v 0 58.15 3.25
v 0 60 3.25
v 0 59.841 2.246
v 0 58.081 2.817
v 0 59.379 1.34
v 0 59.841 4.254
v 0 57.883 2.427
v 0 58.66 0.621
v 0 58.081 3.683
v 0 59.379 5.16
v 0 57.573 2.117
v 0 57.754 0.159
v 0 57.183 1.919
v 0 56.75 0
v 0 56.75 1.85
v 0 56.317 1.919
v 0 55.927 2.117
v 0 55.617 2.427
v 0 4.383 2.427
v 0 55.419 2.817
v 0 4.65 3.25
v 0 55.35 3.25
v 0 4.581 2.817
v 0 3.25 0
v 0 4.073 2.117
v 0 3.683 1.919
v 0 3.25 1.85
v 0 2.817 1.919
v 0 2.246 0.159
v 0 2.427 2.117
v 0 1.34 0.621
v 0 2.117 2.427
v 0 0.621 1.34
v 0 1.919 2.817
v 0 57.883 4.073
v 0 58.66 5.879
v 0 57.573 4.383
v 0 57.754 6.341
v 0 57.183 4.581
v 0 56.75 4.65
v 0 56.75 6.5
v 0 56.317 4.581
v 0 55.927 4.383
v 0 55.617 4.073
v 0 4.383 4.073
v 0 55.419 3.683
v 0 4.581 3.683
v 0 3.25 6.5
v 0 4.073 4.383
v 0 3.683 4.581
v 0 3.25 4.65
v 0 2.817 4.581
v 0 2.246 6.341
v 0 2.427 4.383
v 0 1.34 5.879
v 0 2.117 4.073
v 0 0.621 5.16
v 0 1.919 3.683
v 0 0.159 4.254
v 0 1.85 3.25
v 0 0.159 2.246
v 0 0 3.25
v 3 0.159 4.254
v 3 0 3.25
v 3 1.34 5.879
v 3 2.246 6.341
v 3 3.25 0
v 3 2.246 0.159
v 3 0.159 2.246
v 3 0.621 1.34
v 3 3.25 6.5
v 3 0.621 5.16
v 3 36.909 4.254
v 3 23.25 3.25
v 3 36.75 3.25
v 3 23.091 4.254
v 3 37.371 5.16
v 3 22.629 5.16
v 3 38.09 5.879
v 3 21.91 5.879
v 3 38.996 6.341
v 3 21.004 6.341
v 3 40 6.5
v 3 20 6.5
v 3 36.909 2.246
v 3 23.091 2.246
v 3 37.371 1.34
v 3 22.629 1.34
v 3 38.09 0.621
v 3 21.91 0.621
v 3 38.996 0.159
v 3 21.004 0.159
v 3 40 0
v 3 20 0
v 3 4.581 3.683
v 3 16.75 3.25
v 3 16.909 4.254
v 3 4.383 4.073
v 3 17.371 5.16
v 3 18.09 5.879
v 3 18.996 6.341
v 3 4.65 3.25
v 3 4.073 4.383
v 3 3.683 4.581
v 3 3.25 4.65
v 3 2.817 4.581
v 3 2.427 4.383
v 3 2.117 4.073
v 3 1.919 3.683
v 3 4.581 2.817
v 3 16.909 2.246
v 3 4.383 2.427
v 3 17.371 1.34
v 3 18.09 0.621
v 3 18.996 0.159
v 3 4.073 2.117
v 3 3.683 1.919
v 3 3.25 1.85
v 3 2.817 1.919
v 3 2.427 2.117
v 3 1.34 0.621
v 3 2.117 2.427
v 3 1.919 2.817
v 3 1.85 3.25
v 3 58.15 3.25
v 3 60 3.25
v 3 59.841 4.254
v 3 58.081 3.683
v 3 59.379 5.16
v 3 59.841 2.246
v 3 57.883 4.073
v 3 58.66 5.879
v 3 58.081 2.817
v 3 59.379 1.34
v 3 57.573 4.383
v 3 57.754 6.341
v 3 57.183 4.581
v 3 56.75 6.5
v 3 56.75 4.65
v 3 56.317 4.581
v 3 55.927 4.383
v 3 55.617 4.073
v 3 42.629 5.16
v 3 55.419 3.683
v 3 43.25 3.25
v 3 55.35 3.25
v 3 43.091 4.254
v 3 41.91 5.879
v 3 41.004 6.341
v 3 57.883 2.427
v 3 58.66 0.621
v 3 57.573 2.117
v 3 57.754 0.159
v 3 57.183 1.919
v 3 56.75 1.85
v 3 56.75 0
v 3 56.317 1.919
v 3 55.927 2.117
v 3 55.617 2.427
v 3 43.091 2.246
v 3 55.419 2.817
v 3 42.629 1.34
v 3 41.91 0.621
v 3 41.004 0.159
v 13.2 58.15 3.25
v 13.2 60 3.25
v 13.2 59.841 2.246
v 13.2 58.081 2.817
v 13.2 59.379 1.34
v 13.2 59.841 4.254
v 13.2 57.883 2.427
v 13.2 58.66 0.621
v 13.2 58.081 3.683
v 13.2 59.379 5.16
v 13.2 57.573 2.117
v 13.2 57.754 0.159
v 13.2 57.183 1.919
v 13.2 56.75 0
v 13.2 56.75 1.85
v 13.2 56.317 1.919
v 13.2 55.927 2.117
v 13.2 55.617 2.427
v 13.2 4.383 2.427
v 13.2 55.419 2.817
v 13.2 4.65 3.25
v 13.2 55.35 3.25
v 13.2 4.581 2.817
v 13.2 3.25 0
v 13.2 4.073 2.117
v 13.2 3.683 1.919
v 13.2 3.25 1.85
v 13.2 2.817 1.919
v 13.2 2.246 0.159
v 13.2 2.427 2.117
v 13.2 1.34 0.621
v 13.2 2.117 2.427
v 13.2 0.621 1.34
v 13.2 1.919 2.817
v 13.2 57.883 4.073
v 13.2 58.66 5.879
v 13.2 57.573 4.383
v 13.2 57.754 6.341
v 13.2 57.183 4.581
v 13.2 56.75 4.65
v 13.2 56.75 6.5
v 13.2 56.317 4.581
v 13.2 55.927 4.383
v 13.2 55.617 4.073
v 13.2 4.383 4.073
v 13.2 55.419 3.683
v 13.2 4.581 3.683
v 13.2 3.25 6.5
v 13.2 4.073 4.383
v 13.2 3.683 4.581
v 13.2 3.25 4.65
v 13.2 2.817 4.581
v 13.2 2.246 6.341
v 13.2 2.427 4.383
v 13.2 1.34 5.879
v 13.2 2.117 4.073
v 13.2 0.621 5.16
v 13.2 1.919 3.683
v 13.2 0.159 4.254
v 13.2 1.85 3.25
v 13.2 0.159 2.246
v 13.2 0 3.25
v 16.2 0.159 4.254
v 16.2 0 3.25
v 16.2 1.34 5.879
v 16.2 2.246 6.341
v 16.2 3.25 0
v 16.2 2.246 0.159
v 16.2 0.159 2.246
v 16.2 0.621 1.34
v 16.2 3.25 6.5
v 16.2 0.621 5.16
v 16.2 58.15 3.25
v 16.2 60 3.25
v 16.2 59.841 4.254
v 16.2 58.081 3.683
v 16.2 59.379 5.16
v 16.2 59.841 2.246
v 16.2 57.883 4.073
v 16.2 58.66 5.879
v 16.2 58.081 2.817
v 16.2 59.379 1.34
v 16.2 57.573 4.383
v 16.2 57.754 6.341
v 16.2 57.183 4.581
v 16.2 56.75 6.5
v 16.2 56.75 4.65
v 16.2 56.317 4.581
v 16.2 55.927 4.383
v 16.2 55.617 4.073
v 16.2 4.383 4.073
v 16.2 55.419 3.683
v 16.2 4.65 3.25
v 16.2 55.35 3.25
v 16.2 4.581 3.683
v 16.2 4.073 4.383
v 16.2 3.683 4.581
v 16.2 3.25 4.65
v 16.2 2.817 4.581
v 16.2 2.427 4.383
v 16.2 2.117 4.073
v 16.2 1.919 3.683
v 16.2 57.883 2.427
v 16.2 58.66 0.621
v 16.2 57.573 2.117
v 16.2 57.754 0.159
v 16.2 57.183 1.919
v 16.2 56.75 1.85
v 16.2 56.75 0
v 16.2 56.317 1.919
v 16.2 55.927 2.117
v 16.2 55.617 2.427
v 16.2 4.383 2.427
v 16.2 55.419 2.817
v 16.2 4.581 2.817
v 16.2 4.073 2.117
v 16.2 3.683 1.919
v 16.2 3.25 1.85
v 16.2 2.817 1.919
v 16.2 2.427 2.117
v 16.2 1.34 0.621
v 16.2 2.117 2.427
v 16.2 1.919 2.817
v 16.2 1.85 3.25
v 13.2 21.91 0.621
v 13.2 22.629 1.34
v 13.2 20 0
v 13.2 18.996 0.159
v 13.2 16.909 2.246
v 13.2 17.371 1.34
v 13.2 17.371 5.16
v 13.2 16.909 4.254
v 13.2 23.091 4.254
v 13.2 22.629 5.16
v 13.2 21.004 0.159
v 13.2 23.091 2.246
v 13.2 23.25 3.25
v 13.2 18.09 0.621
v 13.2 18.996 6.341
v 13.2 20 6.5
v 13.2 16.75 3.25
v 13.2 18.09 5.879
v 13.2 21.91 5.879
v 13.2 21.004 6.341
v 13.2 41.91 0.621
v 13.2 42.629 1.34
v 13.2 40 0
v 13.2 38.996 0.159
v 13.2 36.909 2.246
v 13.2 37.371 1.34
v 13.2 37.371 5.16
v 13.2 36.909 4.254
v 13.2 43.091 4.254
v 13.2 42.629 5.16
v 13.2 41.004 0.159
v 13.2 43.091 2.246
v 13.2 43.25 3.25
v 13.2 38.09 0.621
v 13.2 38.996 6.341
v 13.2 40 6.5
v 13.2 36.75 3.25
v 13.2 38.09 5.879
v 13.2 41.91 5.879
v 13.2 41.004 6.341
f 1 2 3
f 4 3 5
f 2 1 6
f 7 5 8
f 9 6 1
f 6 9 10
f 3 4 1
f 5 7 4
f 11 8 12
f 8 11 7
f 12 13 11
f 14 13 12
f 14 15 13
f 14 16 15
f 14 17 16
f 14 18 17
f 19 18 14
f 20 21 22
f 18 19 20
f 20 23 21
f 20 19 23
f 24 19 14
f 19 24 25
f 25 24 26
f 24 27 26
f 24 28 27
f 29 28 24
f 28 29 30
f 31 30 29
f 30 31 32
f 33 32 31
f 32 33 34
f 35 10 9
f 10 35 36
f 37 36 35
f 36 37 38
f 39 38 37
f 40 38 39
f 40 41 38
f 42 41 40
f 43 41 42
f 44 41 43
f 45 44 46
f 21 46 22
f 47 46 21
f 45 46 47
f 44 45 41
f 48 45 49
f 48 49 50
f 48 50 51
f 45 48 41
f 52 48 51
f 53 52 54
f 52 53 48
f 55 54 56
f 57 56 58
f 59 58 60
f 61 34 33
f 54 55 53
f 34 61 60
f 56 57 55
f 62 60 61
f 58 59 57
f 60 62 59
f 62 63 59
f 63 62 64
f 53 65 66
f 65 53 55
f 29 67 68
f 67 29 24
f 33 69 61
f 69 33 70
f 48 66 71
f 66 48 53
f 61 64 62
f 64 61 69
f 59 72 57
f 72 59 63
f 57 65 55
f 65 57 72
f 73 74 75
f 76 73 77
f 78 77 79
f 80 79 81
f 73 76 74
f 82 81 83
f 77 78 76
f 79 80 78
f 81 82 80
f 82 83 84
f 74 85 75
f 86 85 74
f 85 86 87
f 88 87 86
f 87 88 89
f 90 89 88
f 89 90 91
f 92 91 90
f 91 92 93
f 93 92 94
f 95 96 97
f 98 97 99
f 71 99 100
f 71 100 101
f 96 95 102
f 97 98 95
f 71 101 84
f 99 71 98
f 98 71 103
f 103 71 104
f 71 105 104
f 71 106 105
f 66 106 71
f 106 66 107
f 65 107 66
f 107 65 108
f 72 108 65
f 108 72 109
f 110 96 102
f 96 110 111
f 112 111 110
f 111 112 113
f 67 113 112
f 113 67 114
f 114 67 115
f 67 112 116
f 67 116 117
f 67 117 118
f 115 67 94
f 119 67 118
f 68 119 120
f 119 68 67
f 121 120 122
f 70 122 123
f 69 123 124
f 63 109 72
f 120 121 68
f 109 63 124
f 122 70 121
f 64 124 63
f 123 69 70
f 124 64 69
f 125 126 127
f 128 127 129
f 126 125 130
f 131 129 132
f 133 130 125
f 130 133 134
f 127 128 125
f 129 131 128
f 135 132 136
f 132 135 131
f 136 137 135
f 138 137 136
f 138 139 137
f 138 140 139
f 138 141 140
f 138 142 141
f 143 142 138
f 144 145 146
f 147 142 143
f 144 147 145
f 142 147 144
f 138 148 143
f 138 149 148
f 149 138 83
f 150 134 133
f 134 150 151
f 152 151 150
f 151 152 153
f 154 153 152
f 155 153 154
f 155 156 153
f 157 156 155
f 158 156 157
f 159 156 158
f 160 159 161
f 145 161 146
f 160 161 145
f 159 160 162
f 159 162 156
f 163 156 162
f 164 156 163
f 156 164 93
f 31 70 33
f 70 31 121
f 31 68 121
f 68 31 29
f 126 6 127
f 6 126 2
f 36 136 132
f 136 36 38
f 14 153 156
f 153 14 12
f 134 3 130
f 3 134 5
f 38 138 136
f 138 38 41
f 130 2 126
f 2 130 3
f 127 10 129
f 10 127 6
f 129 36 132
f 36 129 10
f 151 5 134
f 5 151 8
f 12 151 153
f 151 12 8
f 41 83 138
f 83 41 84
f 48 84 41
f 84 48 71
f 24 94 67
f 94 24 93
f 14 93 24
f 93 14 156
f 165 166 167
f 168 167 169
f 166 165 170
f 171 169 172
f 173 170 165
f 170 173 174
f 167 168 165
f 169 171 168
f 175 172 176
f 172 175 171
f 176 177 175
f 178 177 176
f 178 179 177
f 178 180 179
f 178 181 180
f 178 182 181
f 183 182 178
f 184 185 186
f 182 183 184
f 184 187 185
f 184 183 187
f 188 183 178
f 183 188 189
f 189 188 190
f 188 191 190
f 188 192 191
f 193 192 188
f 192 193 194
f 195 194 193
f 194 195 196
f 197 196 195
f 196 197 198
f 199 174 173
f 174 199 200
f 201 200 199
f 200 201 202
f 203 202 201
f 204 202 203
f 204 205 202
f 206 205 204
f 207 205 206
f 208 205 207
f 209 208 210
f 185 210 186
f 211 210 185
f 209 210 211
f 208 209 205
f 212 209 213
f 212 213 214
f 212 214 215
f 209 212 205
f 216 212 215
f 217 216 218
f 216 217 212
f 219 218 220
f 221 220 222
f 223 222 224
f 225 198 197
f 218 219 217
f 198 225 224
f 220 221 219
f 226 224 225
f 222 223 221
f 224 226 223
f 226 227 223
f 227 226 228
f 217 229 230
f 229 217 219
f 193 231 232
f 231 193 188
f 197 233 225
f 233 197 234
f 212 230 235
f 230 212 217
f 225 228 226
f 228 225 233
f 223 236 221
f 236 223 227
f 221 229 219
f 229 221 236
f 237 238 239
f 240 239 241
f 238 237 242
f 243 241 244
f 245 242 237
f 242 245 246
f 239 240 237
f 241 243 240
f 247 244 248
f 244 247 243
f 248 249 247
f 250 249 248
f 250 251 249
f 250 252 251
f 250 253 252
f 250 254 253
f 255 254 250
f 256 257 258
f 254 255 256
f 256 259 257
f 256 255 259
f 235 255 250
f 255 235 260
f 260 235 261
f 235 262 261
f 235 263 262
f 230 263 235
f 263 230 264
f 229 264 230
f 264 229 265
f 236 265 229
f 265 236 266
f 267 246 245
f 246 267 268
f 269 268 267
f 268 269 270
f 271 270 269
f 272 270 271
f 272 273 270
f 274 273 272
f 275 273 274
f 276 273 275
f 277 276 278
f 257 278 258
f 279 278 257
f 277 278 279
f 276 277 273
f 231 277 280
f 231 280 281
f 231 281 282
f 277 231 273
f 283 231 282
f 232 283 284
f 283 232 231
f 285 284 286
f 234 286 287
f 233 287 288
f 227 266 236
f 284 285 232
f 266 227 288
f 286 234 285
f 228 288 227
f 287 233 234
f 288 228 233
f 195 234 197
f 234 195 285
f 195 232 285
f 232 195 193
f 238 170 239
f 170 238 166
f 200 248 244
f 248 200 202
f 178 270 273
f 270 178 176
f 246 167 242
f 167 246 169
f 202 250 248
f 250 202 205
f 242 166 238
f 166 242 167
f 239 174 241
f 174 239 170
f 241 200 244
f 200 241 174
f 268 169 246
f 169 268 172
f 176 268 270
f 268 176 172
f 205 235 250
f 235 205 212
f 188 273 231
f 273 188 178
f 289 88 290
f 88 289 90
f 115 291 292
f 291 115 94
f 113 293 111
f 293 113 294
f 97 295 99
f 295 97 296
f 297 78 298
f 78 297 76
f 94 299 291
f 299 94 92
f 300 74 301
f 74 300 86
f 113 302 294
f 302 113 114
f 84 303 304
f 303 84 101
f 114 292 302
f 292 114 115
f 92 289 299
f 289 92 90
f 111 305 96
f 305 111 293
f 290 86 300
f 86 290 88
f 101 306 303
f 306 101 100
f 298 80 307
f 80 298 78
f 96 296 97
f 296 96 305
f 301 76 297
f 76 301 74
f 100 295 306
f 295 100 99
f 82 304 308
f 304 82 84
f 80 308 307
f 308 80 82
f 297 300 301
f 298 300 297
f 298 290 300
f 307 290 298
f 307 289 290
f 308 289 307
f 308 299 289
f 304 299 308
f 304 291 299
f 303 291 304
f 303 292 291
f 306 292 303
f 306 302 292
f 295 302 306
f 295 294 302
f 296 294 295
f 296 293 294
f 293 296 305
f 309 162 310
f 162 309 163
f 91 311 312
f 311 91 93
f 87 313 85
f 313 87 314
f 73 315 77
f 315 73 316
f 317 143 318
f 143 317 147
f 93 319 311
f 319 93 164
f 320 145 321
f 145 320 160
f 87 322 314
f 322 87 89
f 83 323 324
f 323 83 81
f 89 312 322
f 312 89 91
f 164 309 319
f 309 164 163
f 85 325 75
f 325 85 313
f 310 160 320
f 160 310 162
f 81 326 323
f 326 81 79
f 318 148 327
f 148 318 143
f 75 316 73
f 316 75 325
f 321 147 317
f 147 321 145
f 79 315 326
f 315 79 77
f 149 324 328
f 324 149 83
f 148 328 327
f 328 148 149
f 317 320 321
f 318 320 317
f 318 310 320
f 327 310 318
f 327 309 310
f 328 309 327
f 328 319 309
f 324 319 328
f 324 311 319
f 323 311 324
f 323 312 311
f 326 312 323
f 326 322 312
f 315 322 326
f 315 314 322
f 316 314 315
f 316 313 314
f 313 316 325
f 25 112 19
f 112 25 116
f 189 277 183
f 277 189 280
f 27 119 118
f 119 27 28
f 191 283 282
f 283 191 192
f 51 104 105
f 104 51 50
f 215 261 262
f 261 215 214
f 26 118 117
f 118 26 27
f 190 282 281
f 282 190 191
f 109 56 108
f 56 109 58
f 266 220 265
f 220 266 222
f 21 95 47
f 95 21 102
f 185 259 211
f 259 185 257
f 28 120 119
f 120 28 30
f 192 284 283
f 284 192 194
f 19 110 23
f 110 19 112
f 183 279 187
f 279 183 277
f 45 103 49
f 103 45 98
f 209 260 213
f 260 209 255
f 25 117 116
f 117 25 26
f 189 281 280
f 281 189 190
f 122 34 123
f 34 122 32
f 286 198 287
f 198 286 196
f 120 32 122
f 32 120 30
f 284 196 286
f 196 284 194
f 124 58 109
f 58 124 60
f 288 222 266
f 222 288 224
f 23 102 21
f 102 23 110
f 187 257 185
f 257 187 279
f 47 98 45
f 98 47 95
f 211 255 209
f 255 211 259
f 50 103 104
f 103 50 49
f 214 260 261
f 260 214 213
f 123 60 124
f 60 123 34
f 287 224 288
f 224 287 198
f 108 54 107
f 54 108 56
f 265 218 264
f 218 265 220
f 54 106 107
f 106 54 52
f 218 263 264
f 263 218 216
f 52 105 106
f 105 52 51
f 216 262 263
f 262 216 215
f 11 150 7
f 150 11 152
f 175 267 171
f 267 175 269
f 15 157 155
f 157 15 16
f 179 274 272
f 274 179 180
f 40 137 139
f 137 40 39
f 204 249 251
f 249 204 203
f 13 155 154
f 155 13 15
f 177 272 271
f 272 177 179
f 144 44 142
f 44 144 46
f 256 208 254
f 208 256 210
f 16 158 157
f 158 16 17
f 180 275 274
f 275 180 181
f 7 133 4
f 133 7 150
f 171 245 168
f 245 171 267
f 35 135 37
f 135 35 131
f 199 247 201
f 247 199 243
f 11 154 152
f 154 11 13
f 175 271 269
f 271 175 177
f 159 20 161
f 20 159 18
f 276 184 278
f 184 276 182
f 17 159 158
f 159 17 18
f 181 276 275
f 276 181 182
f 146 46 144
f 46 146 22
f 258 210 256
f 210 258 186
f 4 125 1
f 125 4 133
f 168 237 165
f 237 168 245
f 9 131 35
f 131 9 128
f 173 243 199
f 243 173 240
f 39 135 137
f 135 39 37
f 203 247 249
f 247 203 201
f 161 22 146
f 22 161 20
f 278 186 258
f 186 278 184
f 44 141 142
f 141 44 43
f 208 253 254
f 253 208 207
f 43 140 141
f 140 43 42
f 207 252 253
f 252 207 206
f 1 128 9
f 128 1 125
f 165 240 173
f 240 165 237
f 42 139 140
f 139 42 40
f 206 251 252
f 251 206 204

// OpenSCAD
/*
 * Inspired by the "TinyBoy / Fabrikator mini Cam holder"
 * by "andy_a":
 * http://www.thingiverse.com/thing:1434698
 *
 * Created by:
 * Thomas Buck <xythobuz@xythobuz.de> in April 2016
 *
 * Licensed under the Creative Commons - Attribution license.
 */

height = 10.2;
wallSize = 3;
screwInner = 2.8;
screwOuter = 6.5;
length = 60;

$fn = 20;

// -----------------------------------------------------------

module half_circle(d, h) {
    difference() {
        cylinder(d = d, h = h);
        
        translate([0, -(d / 2) - 1, -1])
            cube([(d / 2) + 1, d + 2, h + 2]);
    }
}

module screw() {
    difference() {
        cylinder(d = screwOuter, h = height);
        translate([0, 0, -1])
            cylinder(d = screwInner, h = height + 2);
    }
}

module arm() {
    translate([0, screwOuter / 2, 0])
        cube([wallSize, length - screwOuter, screwOuter]);
    
    translate([0, screwOuter / 2, screwOuter / 2])
        rotate([90, 0, 90])
        half_circle(screwOuter, wallSize);
    
    translate([wallSize, length - (screwOuter / 2), screwOuter / 2])
        rotate([90, 0, 270])
        half_circle(screwOuter, wallSize);
}

%translate([wallSize, length - (screwOuter / 2), screwOuter / 2])
    rotate([0, 90, 0])
    screw();

%translate([wallSize, screwOuter / 2, screwOuter / 2])
    rotate([0, 90, 0])
    screw();

// -----------------------------------------------------------

difference() {
    union() {
        arm();
        
        translate([height + wallSize, 0, 0])
            arm();
        
        translate([wallSize, length / 3, screwOuter / 2])
            rotate([0, 90, 0])
            cylinder(d = screwOuter, h = height);
        
        translate([wallSize, length * 2 / 3, screwOuter / 2])
            rotate([0, 90, 0])
            cylinder(d = screwOuter, h = height);
    }
    
    translate([-1, screwOuter / 2, screwOuter / 2])
        rotate([0, 90, 0])
        cylinder(d = screwInner, h = height + (2 * wallSize) + 2);
    
    translate([-1, length - (screwOuter / 2), screwOuter / 2])
        rotate([0, 90, 0])
        cylinder(d = screwInner, h = height + (2 * wallSize) + 2);
}
